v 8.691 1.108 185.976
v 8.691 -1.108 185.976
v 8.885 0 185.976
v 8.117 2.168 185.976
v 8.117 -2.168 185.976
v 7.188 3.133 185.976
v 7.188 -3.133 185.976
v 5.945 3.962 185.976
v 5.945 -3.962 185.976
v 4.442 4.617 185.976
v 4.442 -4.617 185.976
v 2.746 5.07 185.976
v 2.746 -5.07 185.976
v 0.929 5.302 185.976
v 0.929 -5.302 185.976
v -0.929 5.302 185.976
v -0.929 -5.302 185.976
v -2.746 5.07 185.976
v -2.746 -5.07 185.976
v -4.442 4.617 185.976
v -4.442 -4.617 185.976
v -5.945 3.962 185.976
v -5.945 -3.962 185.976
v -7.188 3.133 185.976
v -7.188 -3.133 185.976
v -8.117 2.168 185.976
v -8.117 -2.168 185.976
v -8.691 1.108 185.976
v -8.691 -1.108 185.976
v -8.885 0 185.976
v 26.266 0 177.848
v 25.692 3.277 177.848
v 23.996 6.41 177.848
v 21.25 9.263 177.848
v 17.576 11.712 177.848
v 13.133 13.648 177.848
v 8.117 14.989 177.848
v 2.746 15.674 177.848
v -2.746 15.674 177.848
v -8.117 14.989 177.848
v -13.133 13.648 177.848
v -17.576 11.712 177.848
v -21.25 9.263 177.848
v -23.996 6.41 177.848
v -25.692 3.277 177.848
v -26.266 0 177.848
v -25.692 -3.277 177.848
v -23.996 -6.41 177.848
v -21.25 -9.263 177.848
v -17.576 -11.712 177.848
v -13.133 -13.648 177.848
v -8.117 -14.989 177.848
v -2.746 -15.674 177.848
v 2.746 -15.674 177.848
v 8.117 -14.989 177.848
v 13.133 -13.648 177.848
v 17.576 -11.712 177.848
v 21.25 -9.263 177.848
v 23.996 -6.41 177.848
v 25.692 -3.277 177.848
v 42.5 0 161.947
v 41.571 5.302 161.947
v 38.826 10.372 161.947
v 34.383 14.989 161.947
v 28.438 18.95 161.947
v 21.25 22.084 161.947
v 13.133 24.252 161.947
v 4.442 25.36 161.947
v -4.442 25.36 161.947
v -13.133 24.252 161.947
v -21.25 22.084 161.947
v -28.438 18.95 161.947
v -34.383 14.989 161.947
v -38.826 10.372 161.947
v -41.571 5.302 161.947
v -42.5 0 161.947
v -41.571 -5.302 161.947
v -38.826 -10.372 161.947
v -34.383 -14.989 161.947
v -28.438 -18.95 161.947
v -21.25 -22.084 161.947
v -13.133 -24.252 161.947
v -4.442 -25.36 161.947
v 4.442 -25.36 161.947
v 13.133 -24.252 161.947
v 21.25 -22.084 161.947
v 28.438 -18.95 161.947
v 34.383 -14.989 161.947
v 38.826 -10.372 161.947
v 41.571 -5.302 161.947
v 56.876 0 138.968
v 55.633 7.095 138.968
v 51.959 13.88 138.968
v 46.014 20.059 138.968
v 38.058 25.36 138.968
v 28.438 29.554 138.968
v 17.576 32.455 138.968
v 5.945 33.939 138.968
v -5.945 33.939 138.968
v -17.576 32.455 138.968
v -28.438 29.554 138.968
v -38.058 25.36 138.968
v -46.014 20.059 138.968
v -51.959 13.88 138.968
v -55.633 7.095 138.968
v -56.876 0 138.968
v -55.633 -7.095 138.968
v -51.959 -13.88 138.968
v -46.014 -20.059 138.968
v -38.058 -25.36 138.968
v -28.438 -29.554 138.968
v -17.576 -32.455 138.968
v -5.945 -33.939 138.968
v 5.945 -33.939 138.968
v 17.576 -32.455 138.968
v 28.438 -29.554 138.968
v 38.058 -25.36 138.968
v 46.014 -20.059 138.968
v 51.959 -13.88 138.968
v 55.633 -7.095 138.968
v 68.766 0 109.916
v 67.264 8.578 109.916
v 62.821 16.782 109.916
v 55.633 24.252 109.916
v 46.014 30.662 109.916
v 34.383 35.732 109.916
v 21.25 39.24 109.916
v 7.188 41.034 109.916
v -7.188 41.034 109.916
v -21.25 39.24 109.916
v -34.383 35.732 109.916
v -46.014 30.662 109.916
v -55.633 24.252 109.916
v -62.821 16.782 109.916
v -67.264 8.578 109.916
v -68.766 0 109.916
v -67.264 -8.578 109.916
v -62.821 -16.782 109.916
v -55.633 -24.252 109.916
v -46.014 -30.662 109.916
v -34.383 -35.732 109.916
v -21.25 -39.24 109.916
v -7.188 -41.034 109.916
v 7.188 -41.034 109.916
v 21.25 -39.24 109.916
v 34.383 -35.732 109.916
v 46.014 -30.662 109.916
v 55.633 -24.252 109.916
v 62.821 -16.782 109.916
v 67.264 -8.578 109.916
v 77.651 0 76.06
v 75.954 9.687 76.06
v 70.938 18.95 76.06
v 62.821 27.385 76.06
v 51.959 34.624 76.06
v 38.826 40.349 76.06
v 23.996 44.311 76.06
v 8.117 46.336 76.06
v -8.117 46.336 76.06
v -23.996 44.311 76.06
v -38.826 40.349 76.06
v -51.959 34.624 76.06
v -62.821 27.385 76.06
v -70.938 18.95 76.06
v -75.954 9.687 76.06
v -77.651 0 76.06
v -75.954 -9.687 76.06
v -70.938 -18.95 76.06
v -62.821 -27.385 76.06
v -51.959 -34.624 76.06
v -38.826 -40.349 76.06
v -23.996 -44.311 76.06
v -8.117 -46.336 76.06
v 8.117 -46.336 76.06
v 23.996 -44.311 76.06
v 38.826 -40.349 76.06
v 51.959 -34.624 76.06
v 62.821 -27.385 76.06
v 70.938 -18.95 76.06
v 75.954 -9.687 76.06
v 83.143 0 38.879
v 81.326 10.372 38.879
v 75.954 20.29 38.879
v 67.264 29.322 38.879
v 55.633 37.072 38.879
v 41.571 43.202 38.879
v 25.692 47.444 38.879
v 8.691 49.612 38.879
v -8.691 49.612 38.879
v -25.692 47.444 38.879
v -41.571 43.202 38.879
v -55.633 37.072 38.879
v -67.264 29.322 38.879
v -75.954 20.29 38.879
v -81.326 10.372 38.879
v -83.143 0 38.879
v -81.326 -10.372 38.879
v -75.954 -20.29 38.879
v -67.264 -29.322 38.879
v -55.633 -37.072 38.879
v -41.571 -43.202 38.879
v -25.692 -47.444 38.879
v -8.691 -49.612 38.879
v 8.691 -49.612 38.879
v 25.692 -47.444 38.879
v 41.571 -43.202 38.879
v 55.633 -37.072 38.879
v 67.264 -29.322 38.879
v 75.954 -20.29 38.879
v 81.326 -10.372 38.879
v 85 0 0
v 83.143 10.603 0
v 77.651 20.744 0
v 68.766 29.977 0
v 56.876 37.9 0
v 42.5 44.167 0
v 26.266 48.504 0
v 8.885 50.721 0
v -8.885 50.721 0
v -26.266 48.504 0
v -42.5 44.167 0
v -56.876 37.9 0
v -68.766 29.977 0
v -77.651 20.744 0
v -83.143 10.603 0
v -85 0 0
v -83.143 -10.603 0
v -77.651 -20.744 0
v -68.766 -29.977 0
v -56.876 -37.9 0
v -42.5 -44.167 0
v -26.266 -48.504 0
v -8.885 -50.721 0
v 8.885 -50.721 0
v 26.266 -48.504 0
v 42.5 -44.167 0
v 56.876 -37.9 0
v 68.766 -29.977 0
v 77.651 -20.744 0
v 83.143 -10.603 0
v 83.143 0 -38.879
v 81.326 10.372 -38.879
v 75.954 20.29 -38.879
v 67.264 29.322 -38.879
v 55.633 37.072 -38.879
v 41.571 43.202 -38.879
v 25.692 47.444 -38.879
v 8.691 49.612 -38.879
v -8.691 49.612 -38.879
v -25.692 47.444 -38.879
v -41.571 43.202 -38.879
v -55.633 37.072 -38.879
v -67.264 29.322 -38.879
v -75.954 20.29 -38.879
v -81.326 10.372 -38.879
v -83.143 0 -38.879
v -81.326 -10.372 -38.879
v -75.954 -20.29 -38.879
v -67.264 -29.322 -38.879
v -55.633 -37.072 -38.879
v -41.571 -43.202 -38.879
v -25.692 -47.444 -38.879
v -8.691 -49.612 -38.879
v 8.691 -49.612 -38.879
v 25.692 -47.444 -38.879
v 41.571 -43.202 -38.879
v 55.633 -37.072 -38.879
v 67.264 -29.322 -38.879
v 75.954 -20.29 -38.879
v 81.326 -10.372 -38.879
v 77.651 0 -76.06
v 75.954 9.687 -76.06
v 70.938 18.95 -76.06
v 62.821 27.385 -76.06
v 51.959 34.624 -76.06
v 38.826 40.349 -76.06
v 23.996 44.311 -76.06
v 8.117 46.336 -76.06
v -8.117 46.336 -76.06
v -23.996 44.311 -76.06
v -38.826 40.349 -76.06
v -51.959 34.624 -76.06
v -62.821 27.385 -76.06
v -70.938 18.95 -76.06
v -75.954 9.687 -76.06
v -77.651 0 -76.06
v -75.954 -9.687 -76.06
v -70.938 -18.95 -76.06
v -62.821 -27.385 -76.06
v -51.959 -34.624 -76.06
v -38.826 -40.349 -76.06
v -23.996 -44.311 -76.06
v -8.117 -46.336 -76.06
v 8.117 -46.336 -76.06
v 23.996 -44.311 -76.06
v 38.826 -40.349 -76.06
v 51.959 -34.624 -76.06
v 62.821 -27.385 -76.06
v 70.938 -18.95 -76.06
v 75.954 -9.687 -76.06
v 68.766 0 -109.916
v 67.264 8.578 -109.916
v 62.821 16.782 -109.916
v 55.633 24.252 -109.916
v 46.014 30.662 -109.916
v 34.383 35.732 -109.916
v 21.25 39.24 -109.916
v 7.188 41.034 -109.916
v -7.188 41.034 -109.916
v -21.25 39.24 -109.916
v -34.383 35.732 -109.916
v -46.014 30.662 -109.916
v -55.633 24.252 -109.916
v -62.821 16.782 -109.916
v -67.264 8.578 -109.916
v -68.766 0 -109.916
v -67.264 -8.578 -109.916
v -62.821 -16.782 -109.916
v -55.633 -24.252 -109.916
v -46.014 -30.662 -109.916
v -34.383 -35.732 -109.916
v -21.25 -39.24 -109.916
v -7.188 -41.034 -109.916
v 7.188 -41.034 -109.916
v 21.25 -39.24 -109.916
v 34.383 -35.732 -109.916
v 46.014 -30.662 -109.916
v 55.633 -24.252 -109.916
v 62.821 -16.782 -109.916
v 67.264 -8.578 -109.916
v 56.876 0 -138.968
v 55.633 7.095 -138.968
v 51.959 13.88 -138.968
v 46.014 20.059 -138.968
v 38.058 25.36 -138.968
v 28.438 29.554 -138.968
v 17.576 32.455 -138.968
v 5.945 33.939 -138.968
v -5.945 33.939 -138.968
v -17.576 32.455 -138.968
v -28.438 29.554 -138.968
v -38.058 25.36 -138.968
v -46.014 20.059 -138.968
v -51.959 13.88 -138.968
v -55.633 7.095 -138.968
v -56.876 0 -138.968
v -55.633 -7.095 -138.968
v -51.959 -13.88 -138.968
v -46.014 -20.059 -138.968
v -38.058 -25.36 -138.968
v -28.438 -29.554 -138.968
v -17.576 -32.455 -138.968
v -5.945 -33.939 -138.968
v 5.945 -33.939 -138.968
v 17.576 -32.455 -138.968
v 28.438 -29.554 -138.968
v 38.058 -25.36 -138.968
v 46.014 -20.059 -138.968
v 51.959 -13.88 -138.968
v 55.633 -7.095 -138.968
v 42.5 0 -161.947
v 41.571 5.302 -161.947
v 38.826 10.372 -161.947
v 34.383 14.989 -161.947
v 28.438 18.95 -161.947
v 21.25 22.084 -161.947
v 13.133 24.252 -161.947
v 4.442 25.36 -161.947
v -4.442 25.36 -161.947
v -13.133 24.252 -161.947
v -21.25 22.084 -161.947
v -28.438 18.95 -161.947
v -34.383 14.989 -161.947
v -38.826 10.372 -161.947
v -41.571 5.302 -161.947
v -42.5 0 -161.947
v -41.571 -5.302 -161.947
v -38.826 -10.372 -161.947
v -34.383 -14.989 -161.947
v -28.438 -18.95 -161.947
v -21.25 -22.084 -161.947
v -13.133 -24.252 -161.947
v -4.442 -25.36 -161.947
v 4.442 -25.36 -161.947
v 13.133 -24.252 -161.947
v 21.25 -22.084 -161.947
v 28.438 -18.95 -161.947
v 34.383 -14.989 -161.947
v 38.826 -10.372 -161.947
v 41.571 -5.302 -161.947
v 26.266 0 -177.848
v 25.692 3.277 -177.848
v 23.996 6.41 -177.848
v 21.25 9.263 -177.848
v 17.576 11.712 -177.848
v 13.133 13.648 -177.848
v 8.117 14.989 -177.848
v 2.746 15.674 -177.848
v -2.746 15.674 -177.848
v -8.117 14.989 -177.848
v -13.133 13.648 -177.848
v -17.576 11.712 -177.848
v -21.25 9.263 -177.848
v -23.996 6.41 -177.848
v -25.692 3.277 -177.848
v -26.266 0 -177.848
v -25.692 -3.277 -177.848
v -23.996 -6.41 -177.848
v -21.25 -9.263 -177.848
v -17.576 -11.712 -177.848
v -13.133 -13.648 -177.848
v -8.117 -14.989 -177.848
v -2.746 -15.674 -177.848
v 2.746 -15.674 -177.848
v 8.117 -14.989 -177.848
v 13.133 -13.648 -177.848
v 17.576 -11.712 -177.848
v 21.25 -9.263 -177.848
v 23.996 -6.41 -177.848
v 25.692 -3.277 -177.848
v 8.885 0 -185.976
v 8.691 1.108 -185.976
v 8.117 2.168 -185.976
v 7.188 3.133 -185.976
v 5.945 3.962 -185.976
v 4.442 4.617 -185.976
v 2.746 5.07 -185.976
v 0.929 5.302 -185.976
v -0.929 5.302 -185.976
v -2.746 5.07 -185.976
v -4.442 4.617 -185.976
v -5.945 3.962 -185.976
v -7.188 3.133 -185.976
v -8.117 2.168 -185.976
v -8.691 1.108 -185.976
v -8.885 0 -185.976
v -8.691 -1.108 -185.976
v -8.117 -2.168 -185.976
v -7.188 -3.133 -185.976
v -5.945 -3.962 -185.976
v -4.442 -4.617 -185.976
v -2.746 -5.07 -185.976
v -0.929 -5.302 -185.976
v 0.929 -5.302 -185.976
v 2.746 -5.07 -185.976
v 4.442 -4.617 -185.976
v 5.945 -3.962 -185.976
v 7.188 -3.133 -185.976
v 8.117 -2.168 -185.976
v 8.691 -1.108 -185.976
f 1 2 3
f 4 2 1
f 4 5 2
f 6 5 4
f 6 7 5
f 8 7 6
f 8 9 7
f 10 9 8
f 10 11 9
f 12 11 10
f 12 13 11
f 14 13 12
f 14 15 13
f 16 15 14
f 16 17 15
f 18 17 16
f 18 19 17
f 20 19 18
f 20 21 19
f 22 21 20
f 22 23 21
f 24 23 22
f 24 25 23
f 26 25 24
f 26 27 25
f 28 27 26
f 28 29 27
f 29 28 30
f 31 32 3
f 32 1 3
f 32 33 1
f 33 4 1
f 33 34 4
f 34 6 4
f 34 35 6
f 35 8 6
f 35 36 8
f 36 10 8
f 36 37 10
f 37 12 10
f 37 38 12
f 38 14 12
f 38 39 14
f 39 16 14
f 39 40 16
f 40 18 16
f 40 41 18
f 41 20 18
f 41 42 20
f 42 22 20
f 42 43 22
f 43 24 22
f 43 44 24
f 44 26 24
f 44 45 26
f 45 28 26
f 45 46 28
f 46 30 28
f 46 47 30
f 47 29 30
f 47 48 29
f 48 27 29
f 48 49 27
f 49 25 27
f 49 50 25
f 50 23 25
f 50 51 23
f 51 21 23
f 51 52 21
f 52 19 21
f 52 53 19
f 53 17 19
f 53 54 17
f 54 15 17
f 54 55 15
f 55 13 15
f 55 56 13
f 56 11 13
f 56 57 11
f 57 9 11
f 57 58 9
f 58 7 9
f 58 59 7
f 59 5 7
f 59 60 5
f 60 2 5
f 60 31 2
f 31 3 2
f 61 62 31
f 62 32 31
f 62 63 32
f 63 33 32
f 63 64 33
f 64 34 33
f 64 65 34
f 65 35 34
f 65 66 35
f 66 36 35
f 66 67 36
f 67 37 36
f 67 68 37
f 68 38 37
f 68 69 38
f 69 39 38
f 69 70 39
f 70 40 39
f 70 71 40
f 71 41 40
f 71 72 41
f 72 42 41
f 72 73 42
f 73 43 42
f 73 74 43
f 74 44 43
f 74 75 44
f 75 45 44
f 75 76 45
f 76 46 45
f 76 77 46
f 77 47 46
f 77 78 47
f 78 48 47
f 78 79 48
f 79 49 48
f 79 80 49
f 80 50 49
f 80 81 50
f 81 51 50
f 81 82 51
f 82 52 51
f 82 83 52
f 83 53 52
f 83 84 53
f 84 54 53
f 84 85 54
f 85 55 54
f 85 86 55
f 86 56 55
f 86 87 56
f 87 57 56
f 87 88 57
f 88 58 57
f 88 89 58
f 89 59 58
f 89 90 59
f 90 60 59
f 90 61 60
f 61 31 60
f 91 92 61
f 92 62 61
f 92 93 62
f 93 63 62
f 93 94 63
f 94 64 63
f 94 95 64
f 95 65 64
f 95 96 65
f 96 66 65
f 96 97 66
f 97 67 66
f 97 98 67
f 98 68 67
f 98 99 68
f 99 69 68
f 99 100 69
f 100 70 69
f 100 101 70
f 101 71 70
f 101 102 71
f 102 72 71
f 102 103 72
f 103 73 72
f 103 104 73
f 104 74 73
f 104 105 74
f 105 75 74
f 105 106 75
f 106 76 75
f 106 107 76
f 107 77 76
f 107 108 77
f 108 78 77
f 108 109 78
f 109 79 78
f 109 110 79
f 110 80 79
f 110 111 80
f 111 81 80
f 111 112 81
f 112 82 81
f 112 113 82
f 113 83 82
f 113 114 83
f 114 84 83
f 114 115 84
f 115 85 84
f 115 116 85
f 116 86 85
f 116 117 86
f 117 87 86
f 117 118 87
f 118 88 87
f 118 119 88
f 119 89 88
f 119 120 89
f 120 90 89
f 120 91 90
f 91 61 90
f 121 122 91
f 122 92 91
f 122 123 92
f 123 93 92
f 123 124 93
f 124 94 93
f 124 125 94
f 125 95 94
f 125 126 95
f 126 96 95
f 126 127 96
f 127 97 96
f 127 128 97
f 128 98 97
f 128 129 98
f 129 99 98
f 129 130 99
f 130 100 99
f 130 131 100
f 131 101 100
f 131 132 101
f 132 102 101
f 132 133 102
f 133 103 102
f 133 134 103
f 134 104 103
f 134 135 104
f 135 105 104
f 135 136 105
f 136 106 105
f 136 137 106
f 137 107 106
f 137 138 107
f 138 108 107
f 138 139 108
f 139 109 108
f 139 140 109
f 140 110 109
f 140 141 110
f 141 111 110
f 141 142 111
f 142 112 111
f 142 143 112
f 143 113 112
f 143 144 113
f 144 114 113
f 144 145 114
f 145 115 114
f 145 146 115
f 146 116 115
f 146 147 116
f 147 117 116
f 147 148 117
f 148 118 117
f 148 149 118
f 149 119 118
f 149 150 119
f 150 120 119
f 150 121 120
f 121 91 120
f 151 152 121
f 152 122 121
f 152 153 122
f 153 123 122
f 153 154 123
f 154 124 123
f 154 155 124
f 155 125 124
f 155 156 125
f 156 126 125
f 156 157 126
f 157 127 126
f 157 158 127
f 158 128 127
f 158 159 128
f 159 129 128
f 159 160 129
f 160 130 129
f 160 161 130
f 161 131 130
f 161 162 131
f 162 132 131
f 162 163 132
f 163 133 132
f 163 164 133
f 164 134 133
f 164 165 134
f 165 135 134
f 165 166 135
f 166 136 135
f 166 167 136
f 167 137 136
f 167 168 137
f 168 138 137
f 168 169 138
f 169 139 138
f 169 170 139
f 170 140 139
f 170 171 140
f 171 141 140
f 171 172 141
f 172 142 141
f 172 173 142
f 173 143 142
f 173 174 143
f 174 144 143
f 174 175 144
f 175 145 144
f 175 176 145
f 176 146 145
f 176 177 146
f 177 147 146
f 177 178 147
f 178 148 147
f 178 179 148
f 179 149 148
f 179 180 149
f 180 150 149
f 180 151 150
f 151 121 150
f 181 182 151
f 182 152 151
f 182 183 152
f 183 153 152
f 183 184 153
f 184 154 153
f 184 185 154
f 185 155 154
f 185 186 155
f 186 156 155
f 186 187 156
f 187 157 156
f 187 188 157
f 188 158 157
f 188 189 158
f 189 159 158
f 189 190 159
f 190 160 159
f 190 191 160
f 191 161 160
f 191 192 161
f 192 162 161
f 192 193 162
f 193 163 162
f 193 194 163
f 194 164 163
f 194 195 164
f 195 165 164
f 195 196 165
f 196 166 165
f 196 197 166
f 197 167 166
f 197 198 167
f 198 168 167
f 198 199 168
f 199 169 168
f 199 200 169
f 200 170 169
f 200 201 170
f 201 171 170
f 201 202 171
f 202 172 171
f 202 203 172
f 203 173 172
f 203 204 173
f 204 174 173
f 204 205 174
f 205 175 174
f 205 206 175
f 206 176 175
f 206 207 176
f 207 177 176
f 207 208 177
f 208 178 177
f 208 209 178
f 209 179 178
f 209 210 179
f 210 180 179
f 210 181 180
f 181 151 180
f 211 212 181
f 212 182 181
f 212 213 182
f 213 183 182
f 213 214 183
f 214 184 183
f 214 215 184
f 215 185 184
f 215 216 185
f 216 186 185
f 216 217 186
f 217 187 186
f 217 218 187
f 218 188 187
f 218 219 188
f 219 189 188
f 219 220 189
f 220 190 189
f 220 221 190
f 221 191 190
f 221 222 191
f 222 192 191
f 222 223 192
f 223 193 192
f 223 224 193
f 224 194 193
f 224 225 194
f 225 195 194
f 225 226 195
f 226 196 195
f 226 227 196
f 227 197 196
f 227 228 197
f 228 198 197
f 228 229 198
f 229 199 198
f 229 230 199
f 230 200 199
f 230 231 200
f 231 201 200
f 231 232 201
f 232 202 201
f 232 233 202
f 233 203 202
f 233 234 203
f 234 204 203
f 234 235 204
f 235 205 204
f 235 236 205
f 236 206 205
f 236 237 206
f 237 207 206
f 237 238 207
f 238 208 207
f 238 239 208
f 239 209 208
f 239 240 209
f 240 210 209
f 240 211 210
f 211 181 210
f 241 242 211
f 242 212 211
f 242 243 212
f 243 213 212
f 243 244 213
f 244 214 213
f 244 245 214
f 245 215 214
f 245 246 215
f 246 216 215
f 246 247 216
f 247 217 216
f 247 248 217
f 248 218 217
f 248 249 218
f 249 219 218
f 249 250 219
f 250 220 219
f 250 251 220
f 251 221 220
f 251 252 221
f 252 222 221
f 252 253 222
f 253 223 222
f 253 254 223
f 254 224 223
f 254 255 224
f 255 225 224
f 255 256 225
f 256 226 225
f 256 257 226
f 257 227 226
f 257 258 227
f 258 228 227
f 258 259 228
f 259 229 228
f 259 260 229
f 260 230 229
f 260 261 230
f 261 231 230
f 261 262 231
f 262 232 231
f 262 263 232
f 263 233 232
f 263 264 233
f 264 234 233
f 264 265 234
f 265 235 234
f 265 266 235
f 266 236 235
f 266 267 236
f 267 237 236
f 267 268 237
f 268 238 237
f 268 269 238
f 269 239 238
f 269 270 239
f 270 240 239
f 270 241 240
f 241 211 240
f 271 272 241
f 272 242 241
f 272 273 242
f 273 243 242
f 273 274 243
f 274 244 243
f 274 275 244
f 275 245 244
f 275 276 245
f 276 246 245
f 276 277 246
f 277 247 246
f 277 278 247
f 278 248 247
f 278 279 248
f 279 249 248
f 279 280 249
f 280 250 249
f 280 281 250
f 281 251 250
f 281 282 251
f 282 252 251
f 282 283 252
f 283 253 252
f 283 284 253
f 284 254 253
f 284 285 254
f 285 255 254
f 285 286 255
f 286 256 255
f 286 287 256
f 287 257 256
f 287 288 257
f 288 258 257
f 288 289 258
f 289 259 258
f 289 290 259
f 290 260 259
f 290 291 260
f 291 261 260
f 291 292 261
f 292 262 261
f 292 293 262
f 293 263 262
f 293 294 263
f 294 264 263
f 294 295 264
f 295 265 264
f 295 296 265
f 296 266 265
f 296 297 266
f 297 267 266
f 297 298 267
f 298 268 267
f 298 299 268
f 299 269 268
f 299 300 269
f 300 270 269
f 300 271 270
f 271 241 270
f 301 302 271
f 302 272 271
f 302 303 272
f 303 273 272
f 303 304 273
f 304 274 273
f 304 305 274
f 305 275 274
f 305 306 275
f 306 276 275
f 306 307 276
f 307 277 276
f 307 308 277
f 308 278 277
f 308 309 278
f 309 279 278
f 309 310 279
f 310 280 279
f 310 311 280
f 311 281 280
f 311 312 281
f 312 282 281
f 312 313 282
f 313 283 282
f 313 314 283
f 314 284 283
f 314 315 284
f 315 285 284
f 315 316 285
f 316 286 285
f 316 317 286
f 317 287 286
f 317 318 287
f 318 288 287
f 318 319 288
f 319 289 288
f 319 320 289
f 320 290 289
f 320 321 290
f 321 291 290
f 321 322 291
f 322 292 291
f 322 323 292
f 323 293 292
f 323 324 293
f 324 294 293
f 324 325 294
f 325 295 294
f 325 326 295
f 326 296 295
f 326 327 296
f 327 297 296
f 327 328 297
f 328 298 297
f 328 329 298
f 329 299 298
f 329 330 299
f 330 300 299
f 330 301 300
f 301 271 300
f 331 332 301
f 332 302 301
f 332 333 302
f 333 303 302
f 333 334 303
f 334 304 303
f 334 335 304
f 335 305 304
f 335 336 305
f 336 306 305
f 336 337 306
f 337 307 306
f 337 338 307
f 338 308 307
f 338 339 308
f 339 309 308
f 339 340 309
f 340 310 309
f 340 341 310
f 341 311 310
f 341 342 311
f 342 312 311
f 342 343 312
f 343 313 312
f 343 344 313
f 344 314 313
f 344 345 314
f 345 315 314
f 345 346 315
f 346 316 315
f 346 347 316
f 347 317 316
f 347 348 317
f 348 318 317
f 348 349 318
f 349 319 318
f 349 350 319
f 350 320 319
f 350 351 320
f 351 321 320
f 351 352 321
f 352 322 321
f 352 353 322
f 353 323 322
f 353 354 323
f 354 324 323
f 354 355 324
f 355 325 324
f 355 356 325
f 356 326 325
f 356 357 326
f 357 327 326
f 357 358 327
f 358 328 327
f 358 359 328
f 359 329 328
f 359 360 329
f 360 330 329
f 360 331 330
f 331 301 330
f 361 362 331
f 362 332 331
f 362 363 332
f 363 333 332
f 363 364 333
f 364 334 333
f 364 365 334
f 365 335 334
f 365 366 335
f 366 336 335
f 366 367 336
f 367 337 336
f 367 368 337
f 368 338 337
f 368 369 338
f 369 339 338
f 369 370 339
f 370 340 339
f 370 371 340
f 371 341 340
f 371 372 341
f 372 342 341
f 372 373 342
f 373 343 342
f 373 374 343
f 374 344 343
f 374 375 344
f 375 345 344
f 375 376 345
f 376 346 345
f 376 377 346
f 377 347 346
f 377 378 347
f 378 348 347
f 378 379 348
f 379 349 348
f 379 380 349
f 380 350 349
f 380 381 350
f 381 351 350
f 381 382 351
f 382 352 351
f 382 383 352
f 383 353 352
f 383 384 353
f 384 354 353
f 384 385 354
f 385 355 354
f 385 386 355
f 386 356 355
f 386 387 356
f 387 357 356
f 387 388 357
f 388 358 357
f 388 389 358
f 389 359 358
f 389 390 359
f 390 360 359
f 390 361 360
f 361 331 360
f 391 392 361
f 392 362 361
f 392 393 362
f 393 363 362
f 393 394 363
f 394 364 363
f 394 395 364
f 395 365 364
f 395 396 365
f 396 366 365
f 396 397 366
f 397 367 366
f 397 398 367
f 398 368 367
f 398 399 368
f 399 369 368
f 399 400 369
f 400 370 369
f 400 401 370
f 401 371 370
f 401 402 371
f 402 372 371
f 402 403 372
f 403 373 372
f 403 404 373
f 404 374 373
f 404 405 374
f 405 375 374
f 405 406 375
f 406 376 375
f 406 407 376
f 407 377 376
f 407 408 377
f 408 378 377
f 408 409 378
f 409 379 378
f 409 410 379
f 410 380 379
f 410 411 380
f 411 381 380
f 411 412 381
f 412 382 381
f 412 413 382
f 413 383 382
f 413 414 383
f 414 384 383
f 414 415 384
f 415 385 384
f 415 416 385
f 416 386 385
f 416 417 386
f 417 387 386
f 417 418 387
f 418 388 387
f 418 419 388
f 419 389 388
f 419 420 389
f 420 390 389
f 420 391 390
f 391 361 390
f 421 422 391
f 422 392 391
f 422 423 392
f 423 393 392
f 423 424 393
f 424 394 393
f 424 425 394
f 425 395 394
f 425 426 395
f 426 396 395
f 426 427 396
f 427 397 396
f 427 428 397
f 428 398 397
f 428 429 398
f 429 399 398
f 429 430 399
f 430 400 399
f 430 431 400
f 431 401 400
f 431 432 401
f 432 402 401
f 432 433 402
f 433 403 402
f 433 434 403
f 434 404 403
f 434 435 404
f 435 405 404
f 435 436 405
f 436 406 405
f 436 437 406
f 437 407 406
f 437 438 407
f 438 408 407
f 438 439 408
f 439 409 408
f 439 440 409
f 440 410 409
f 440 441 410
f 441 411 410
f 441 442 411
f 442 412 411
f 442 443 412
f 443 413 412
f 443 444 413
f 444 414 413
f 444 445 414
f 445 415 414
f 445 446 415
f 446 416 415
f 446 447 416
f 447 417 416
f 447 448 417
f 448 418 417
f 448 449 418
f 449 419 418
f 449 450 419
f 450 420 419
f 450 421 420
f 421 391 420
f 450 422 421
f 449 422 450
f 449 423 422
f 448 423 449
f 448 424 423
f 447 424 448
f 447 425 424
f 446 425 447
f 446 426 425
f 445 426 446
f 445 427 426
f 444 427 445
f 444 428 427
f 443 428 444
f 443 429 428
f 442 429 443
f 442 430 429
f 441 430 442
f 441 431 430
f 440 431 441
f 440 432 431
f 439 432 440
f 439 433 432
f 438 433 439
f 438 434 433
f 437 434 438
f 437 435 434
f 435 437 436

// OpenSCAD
// Generated by SolidPython 1.0.1 on 2020-07-29 00:46:46


scale(v = [5, 3, 11]) {
	sphere(r = 17);
}
/***********************************************
*********      SolidPython code:      **********
************************************************
 
# import packages: SolidPython
from solid import *
from solid.utils import *
from itertools import chain, combinations, permutations


class Resize:

    def __init__(self, scad_file):
        self.scad_file = scad_file
        #self.scad_file = import_scad(scad_file)
        # cone/cylinder param:
        self.r1 = 0
        self.r2 = 0
        self.h = 0
        # rectangular prism param:
        self.w = 0
        self.l = 0
        # ellipse param:
        self.r = 0

    # import OpenScad code (file name corresponds to shape)


    # classify shape + parameters
    def assign(self, param1, param2, param3):
        if self.scad_file == 'cone.scad':
            self.r1 = param1
            self.r2 = param2
            self.h = param3
        elif self.scad_file == 'cylinder.scad':
            self.r1 = param1
            self.r2 = param2
            self.h = param3
        elif self.scad_file == 'rectangularPrism.scad':
            self.h = param1
            self.l = param2
            self.w = param3
        else:
            self.r = param1
            self.h = param2

    # resize parameters
    def iterate(self):
        x = range(3, 20, 2)
        i = 1
        if self.scad_file == 'cone.scad':
            tempList = list(permutations(x, 2))
            for temp in tempList:
                param1 = temp[0]
                param2 = temp[1]
                filepath = 'produced_scad_files/' + 'cone' + str(param1) + '_' + str(param2) + '_' + '.scad'
                scad_render_to_file(cylinder(h=param1, r1=param2, r2=0), filepath)

        elif self.scad_file == 'cylinder.scad':
            tempList = list(permutations(x, 3))
            for temp in tempList:
                param1 = temp[0]
                param2 = temp[1]
                filepath = 'produced_scad_files/' + 'cylinder' + str(param1) + '_' + str(param2) + '_' + '.scad'
                scad_render_to_file(cylinder(h=param1, r1=param2, r2=param2), filepath)

        elif self.scad_file == 'rectangularPrism.scad':
            tempList = list(permutations(x, 3))
            for temp in tempList:
                param1 = temp[0]
                param2 = temp[1]
                param3 = temp[2]
                filepath = 'produced_scad_files/' + 'rectangularPrism' + str(param1) + '_' + str(param2) + '_' + str(
                    param3) + '.scad'
                scad_render_to_file(cube(size=(param1, param2, param3)), filepath)

        elif self.scad_file == 'ellipse.scad':
            tempList = list(permutations(x, 4))
            for temp in tempList:
                param1 = temp[0]
                param2 = temp[1]
                param3 = temp[2]
                param4 = temp[3]
                filepath = 'produced_scad_files/' + 'ellipse' + str(param1) + '_' + str(param2) + '_' + str(param3) + '_' + str(param4) + '.scad'
                scad_render_to_file(scale([param1, param2, param3])(sphere(r=param4)), filepath)

    def render_to_scadfile(self):
        scad_render_to_file(scad, 'example.scad') 
 
************************************************/
